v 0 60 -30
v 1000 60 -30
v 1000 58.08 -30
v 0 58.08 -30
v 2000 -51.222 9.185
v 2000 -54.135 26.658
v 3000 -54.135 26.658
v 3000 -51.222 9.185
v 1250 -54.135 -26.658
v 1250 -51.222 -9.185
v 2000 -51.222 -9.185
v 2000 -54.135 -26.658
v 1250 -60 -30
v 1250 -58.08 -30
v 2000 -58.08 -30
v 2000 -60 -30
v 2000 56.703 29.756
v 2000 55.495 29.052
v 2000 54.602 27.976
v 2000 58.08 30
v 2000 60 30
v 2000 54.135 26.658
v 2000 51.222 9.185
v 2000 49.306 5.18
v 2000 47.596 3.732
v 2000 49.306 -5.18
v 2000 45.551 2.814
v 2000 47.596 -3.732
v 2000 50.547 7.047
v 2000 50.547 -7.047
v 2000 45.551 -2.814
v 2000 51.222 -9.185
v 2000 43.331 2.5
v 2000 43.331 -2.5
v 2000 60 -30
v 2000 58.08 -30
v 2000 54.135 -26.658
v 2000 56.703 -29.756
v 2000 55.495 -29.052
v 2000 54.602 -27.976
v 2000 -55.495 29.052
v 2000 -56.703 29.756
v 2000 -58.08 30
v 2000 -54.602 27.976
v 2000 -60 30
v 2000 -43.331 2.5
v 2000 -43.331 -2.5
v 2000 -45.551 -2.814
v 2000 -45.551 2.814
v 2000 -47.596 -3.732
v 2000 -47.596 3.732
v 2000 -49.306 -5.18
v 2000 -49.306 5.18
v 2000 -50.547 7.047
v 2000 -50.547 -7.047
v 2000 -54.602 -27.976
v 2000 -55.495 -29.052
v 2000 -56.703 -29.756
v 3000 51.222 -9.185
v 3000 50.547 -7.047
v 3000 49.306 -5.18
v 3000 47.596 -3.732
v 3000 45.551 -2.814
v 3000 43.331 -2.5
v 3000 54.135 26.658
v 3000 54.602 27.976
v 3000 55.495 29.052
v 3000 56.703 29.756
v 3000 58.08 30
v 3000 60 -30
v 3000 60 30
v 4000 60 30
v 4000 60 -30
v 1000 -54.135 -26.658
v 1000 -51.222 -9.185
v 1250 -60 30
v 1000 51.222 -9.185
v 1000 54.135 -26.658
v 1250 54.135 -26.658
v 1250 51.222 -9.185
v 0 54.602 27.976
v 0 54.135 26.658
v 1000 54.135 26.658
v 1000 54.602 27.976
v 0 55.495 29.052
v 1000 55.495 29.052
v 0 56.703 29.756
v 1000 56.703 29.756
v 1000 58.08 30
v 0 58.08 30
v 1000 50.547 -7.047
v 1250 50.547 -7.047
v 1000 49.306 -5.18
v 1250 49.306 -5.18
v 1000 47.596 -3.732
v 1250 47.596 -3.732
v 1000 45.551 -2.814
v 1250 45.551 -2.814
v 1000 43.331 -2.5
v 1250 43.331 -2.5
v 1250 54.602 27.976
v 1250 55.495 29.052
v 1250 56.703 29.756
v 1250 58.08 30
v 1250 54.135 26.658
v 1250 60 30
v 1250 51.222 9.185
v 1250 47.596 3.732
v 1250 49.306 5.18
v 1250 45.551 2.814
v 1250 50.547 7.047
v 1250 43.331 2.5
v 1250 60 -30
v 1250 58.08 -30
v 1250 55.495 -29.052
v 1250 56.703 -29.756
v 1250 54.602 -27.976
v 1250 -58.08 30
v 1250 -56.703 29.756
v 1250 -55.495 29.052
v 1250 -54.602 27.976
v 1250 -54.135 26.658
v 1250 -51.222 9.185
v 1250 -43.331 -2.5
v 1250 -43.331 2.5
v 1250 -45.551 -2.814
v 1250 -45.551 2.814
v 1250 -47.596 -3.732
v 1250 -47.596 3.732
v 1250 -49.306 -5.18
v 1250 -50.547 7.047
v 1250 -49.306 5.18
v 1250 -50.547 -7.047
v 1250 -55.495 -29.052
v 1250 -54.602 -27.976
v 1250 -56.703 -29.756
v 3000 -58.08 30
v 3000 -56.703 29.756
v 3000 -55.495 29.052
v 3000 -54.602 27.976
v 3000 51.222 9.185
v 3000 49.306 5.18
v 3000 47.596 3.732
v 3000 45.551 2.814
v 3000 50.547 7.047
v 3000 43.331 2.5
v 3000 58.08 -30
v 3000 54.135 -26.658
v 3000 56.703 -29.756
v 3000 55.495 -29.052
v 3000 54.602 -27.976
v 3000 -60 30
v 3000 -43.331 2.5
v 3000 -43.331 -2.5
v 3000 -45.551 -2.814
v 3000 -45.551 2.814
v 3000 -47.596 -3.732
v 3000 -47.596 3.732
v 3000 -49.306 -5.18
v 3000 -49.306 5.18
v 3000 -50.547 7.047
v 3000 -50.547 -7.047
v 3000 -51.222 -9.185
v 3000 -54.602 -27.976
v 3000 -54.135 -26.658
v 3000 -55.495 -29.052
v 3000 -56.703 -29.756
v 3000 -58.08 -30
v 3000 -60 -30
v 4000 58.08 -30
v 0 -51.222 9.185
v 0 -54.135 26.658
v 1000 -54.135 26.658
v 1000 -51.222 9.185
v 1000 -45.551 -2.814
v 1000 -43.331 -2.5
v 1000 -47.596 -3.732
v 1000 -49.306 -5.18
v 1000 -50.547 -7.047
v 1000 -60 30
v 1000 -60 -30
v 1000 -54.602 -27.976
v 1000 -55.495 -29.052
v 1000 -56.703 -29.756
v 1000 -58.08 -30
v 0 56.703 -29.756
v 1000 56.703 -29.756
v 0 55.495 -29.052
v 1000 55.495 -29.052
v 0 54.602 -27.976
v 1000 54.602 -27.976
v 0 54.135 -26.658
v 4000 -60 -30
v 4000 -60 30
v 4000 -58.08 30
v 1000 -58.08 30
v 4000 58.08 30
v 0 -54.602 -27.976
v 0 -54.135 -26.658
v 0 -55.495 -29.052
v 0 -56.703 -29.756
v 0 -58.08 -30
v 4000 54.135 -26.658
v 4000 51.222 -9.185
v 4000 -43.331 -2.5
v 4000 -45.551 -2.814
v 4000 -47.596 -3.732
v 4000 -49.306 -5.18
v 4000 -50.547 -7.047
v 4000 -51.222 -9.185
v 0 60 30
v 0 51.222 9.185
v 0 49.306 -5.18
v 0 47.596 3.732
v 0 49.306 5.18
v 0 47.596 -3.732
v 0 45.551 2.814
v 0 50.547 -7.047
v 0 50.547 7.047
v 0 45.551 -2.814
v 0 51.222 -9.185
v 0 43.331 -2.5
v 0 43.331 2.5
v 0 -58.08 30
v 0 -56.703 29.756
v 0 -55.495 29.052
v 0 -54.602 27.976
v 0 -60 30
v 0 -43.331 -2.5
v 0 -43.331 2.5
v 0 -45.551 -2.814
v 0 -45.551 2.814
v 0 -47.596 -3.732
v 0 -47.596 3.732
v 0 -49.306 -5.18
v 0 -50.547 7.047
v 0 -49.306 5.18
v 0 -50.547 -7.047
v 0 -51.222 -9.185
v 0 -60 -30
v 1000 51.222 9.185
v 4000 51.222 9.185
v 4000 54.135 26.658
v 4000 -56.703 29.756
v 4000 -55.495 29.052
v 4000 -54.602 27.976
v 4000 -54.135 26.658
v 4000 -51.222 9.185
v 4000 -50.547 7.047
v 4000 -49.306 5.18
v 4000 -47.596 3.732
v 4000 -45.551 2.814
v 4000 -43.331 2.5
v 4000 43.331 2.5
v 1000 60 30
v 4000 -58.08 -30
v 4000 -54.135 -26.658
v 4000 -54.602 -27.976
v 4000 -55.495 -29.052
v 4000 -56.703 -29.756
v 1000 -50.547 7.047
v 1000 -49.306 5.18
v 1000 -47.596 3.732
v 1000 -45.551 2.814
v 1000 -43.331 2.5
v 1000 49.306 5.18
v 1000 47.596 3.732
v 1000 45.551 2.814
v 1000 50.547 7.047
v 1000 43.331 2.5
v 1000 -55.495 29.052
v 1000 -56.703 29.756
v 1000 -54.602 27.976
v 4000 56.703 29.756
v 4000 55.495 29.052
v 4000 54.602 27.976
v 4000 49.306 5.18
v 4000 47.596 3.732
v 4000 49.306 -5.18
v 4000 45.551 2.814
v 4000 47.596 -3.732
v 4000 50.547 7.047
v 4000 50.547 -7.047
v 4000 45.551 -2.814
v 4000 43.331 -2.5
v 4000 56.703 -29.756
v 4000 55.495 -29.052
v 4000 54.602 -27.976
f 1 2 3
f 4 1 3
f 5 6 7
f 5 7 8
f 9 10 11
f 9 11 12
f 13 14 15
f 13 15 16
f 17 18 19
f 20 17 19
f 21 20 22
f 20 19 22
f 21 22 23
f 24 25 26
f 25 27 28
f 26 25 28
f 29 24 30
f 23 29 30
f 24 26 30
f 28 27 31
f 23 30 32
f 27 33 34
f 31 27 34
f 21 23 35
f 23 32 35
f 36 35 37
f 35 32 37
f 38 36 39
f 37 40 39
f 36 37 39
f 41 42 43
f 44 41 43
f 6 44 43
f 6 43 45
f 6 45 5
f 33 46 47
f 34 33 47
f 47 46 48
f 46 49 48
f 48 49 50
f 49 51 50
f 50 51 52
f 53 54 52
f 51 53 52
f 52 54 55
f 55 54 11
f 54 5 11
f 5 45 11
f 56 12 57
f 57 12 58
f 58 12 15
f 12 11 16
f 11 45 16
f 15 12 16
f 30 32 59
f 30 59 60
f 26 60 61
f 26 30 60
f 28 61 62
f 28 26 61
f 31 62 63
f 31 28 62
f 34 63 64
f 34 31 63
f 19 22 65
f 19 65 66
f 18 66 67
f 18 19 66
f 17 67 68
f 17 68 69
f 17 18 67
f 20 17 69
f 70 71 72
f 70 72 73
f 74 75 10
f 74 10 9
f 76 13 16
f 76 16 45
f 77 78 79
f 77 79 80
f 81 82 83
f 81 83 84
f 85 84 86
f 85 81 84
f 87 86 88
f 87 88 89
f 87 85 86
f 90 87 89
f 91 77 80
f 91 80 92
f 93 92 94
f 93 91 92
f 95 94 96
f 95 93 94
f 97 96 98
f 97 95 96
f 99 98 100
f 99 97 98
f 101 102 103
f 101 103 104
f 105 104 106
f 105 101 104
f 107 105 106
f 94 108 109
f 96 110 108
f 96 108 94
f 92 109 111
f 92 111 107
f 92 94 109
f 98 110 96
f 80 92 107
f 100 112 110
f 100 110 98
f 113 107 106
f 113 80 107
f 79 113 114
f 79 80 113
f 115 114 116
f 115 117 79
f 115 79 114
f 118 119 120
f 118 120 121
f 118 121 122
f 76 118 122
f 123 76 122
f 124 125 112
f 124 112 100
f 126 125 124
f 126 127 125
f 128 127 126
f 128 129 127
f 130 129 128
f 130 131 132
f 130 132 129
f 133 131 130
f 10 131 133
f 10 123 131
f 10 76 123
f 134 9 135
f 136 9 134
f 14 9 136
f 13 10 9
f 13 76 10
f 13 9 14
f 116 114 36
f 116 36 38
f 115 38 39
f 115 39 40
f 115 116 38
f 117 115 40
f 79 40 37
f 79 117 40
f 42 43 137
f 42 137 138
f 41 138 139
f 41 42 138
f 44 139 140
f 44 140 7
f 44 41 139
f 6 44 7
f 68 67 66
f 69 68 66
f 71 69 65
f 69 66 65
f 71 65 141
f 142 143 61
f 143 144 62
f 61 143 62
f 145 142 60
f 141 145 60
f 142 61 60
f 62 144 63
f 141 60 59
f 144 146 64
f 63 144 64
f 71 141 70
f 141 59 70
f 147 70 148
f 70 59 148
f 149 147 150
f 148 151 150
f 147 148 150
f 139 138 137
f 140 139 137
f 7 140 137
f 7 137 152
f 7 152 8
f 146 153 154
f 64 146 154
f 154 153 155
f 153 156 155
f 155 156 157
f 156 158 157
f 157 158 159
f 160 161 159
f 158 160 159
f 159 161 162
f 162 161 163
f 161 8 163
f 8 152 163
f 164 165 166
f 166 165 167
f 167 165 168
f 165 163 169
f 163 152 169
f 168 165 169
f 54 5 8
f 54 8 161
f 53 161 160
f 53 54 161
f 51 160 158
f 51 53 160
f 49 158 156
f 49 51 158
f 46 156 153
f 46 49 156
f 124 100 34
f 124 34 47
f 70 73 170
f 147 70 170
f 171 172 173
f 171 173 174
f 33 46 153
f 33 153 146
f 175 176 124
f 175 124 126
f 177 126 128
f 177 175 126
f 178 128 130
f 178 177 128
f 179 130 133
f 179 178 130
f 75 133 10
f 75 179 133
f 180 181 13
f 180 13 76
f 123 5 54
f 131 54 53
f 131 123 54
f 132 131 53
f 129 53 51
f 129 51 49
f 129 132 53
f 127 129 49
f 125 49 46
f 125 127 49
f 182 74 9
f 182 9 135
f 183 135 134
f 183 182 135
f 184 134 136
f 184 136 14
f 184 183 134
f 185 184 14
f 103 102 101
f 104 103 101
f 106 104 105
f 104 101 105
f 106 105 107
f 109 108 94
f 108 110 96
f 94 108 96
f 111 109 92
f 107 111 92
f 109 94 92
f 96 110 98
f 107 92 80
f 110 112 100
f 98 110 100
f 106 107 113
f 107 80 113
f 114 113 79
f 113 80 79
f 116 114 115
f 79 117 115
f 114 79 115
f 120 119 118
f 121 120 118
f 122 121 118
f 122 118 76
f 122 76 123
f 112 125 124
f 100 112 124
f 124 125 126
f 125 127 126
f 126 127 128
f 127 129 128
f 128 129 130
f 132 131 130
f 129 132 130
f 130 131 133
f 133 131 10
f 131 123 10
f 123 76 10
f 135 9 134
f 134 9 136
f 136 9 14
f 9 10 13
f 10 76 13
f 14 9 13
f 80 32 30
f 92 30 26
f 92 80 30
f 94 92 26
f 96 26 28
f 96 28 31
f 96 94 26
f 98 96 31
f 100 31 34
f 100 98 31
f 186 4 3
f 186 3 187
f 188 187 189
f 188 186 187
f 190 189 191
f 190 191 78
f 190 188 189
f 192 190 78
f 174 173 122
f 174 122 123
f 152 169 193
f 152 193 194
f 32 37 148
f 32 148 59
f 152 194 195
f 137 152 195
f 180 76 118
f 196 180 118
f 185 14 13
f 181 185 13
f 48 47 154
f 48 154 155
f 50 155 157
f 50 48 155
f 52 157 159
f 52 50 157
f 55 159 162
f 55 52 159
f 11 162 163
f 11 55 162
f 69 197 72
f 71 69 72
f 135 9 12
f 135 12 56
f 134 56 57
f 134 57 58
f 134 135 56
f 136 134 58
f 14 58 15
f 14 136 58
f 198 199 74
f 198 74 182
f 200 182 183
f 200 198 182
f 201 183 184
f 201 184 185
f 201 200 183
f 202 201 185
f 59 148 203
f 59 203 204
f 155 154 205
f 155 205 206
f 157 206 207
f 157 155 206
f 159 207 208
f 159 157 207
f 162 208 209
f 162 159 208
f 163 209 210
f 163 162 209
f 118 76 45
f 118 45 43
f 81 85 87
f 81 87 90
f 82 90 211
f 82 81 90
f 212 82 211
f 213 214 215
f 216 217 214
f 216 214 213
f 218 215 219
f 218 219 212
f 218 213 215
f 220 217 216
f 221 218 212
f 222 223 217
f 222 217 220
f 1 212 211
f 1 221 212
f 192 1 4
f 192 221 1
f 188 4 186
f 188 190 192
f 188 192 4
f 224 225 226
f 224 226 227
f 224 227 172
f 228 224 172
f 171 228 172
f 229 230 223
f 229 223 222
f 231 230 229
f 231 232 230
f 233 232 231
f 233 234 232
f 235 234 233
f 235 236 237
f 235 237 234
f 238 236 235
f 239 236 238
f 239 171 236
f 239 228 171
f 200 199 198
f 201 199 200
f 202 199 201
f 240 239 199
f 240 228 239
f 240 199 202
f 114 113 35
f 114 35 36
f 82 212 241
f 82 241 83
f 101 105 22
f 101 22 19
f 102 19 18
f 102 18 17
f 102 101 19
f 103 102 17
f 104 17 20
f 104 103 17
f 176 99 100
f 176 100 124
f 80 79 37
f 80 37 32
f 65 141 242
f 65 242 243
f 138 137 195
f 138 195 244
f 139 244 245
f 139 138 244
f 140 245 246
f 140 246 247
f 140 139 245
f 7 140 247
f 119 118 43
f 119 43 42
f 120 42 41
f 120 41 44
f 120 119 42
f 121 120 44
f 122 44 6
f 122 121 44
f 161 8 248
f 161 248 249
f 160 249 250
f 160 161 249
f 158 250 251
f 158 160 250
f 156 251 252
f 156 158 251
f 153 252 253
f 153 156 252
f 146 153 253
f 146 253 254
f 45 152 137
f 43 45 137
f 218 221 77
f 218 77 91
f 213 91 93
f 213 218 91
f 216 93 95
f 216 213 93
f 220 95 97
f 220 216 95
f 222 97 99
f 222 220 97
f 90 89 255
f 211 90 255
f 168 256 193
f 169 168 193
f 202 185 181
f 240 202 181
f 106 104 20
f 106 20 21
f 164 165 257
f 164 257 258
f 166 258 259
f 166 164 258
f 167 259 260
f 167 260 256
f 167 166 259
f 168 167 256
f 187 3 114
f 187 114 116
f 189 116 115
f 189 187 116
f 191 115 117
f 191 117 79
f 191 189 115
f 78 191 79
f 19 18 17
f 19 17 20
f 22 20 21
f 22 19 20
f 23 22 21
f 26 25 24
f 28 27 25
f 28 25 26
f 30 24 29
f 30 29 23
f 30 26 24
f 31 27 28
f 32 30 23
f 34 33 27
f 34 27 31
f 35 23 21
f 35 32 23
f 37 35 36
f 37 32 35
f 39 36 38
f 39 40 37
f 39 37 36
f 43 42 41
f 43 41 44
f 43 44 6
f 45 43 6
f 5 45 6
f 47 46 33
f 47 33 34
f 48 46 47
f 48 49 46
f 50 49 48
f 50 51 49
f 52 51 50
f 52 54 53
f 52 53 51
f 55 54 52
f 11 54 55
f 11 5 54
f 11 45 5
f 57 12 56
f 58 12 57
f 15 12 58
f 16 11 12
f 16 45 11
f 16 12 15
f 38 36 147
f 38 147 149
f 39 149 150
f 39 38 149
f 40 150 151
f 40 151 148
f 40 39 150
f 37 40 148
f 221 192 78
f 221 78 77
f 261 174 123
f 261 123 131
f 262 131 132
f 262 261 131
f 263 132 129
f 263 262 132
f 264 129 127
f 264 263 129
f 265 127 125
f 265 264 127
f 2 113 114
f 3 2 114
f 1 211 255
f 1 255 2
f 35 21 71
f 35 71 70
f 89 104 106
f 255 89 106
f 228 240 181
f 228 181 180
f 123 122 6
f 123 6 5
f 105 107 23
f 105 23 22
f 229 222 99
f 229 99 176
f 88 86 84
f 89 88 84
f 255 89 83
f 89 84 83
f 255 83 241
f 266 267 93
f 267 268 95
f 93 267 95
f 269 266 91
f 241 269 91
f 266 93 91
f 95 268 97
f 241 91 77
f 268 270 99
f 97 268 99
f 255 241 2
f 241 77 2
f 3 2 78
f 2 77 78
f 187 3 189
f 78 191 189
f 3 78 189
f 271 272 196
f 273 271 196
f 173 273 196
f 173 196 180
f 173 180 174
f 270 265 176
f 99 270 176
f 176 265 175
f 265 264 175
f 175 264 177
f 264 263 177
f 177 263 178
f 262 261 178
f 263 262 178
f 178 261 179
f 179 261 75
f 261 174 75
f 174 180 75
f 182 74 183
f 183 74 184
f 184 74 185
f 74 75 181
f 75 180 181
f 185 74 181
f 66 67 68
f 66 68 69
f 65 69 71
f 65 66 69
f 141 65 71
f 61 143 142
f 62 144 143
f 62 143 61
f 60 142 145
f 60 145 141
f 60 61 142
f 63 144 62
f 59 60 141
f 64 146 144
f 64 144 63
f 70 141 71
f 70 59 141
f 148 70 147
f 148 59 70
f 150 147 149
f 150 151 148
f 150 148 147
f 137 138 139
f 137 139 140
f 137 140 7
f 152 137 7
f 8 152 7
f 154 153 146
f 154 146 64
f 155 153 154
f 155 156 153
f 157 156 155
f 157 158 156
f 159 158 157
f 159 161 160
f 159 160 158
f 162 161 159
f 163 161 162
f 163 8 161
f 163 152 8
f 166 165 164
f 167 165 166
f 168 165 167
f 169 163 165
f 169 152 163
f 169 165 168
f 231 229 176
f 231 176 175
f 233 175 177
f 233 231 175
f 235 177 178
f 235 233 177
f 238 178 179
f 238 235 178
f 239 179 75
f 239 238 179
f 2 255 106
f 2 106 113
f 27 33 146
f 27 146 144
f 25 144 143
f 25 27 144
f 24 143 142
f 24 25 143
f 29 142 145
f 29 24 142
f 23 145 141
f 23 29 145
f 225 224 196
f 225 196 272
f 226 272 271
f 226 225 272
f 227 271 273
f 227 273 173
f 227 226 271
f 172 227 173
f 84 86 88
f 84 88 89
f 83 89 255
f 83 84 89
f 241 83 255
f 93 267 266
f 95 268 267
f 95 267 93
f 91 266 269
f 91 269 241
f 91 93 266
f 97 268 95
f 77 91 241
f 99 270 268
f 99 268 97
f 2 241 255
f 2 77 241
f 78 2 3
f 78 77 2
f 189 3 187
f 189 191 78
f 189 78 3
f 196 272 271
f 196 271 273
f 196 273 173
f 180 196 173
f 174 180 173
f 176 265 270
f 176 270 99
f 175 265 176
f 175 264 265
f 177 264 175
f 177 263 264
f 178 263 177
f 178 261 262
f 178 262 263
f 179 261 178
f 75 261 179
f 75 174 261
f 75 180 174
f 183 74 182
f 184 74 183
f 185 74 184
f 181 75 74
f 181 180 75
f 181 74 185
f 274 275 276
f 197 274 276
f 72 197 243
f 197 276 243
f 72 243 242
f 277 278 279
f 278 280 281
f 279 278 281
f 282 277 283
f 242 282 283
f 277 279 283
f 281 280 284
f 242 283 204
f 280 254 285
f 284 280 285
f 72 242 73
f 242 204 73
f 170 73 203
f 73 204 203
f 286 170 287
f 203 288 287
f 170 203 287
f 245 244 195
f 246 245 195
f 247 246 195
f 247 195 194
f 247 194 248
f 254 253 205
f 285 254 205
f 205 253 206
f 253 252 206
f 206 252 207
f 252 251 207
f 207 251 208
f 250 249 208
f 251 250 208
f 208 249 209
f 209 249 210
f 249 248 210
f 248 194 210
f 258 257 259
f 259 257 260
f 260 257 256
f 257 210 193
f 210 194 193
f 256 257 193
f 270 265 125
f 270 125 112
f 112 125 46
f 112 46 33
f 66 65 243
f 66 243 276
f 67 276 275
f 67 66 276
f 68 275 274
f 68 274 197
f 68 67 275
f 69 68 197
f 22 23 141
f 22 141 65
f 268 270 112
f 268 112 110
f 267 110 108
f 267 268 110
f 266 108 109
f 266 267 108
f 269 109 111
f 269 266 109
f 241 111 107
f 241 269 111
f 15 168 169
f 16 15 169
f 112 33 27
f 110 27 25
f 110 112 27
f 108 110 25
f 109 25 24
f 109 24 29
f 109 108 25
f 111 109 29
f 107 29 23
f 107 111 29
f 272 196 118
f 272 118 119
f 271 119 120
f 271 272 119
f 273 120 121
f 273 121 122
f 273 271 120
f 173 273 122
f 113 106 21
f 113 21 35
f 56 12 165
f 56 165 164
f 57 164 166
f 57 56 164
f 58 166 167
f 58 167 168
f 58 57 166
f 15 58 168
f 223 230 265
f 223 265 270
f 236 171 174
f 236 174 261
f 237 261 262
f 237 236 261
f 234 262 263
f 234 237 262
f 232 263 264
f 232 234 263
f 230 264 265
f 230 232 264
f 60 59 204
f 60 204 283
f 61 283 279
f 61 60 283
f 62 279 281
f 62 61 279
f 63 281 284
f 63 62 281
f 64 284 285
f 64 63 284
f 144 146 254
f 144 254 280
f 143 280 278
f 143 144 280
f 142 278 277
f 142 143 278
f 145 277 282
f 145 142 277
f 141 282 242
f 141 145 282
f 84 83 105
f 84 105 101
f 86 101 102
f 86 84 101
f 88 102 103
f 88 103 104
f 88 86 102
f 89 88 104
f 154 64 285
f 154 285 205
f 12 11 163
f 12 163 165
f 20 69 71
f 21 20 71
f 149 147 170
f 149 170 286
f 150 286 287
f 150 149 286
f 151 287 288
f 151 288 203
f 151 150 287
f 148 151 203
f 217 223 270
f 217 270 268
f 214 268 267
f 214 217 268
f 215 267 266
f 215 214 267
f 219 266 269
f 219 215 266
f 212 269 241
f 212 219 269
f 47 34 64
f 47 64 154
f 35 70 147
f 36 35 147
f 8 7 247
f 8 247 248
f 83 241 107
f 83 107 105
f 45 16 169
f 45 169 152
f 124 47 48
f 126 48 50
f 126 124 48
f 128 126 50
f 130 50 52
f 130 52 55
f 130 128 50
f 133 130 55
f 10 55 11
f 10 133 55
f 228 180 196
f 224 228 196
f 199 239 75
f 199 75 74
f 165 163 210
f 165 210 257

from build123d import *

# Parameters (mm, degrees)
SB_BEAM_120_X_12_1_DEPTH   = 1000
SB_BEAM_120_X_12_1_2_DEPTH = 250
SB_BEAM_120_X_12_1_3_DEPTH = 750
SB_BEAM_120_X_12_1_4_DEPTH = 1000
SB_BEAM_120_X_12_1_5_DEPTH = 1000


with BuildPart() as part:
    # Sketch11 → Sb beam 120 X 12(1) (new body)
    with BuildSketch(Plane(origin=(0, 0, 0), x_dir=(0, 0, 1), z_dir=(1, 0, 0))):
        with BuildLine():
            Line((-30, -60), (-30, -58.080070835))
            ThreePointArc((-30, -58.080070835), (-29.052095223, -55.494589303), (-26.657642624, -54.134502919))
            Line((-26.657642624, -54.134502919), (-9.184714752, -51.222135832))
            ThreePointArc((-9.184714752, -51.222135832), (-4.395809555, -48.501963064), (-2.5, -43.331))
            Line((-2.5, -43.331), (-2.5, 43.331))
            ThreePointArc((-2.5, 43.331), (-4.395809555, 48.501963064), (-9.184714752, 51.222135832))
            Line((-9.184714752, 51.222135832), (-26.657642624, 54.134502919))
            ThreePointArc((-26.657642624, 54.134502919), (-29.052095223, 55.494589303), (-30, 58.080070835))
            Line((-30, 58.080070835), (-30, 60))
            Line((-30, 60), (30, 60))
            Line((30, 60), (30, 58.080070835))
            ThreePointArc((30, 58.080070835), (29.052095223, 55.494589303), (26.657642624, 54.134502919))
            Line((26.657642624, 54.134502919), (9.184714752, 51.222135832))
            ThreePointArc((9.184714752, 51.222135832), (4.395809555, 48.501963064), (2.5, 43.331))
            Line((2.5, 43.331), (2.5, -43.331))
            ThreePointArc((2.5, -43.331), (4.395809555, -48.501963064), (9.184714752, -51.222135832))
            Line((9.184714752, -51.222135832), (26.657642624, -54.134502919))
            ThreePointArc((26.657642624, -54.134502919), (29.052095223, -55.494589303), (30, -58.080070835))
            Line((30, -58.080070835), (30, -60))
            Line((30, -60), (-30, -60))
        make_face()
    extrude(amount=SB_BEAM_120_X_12_1_DEPTH)


with BuildPart() as body_2:
    # Sketch11 on segment 2 (carried to segment 2) → Sb beam 120 X 12_1 2 (new body)
    with BuildSketch(Plane(origin=(1000, 0, 0), x_dir=(0, 0, 1), z_dir=(1, 0, 0))):
        with BuildLine():
            Line((-30, -60), (-30, -58.080070835))
            ThreePointArc((-30, -58.080070835), (-29.052095223, -55.494589303), (-26.657642624, -54.134502919))
            Line((-26.657642624, -54.134502919), (-9.184714752, -51.222135832))
            ThreePointArc((-9.184714752, -51.222135832), (-4.395809555, -48.501963064), (-2.5, -43.331))
            Line((-2.5, -43.331), (-2.5, 43.331))
            ThreePointArc((-2.5, 43.331), (-4.395809555, 48.501963064), (-9.184714752, 51.222135832))
            Line((-9.184714752, 51.222135832), (-26.657642624, 54.134502919))
            ThreePointArc((-26.657642624, 54.134502919), (-29.052095223, 55.494589303), (-30, 58.080070835))
            Line((-30, 58.080070835), (-30, 60))
            Line((-30, 60), (30, 60))
            Line((30, 60), (30, 58.080070835))
            ThreePointArc((30, 58.080070835), (29.052095223, 55.494589303), (26.657642624, 54.134502919))
            Line((26.657642624, 54.134502919), (9.184714752, 51.222135832))
            ThreePointArc((9.184714752, 51.222135832), (4.395809555, 48.501963064), (2.5, 43.331))
            Line((2.5, 43.331), (2.5, -43.331))
            ThreePointArc((2.5, -43.331), (4.395809555, -48.501963064), (9.184714752, -51.222135832))
            Line((9.184714752, -51.222135832), (26.657642624, -54.134502919))
            ThreePointArc((26.657642624, -54.134502919), (29.052095223, -55.494589303), (30, -58.080070835))
            Line((30, -58.080070835), (30, -60))
            Line((30, -60), (-30, -60))
        make_face()
    extrude(amount=SB_BEAM_120_X_12_1_2_DEPTH)


with BuildPart() as body_3:
    # Sketch11 on segment 3 (carried to segment 3) → Sb beam 120 X 12_1 3 (new body)
    with BuildSketch(Plane(origin=(1250, 0, 0), x_dir=(0, 0, 1), z_dir=(1, 0, 0))):
        with BuildLine():
            Line((-30, -60), (-30, -58.080070835))
            ThreePointArc((-30, -58.080070835), (-29.052095223, -55.494589303), (-26.657642624, -54.134502919))
            Line((-26.657642624, -54.134502919), (-9.184714752, -51.222135832))
            ThreePointArc((-9.184714752, -51.222135832), (-4.395809555, -48.501963064), (-2.5, -43.331))
            Line((-2.5, -43.331), (-2.5, 43.331))
            ThreePointArc((-2.5, 43.331), (-4.395809555, 48.501963064), (-9.184714752, 51.222135832))
            Line((-9.184714752, 51.222135832), (-26.657642624, 54.134502919))
            ThreePointArc((-26.657642624, 54.134502919), (-29.052095223, 55.494589303), (-30, 58.080070835))
            Line((-30, 58.080070835), (-30, 60))
            Line((-30, 60), (30, 60))
            Line((30, 60), (30, 58.080070835))
            ThreePointArc((30, 58.080070835), (29.052095223, 55.494589303), (26.657642624, 54.134502919))
            Line((26.657642624, 54.134502919), (9.184714752, 51.222135832))
            ThreePointArc((9.184714752, 51.222135832), (4.395809555, 48.501963064), (2.5, 43.331))
            Line((2.5, 43.331), (2.5, -43.331))
            ThreePointArc((2.5, -43.331), (4.395809555, -48.501963064), (9.184714752, -51.222135832))
            Line((9.184714752, -51.222135832), (26.657642624, -54.134502919))
            ThreePointArc((26.657642624, -54.134502919), (29.052095223, -55.494589303), (30, -58.080070835))
            Line((30, -58.080070835), (30, -60))
            Line((30, -60), (-30, -60))
        make_face()
    extrude(amount=SB_BEAM_120_X_12_1_3_DEPTH)


with BuildPart() as body_4:
    # Sketch11 on segment 4 (carried to segment 4) → Sb beam 120 X 12_1 4 (new body)
    with BuildSketch(Plane(origin=(2000, 0, 0), x_dir=(0, 0, 1), z_dir=(1, 0, 0))):
        with BuildLine():
            Line((-30, -60), (-30, -58.080070835))
            ThreePointArc((-30, -58.080070835), (-29.052095223, -55.494589303), (-26.657642624, -54.134502919))
            Line((-26.657642624, -54.134502919), (-9.184714752, -51.222135832))
            ThreePointArc((-9.184714752, -51.222135832), (-4.395809555, -48.501963064), (-2.5, -43.331))
            Line((-2.5, -43.331), (-2.5, 43.331))
            ThreePointArc((-2.5, 43.331), (-4.395809555, 48.501963064), (-9.184714752, 51.222135832))
            Line((-9.184714752, 51.222135832), (-26.657642624, 54.134502919))
            ThreePointArc((-26.657642624, 54.134502919), (-29.052095223, 55.494589303), (-30, 58.080070835))
            Line((-30, 58.080070835), (-30, 60))
            Line((-30, 60), (30, 60))
            Line((30, 60), (30, 58.080070835))
            ThreePointArc((30, 58.080070835), (29.052095223, 55.494589303), (26.657642624, 54.134502919))
            Line((26.657642624, 54.134502919), (9.184714752, 51.222135832))
            ThreePointArc((9.184714752, 51.222135832), (4.395809555, 48.501963064), (2.5, 43.331))
            Line((2.5, 43.331), (2.5, -43.331))
            ThreePointArc((2.5, -43.331), (4.395809555, -48.501963064), (9.184714752, -51.222135832))
            Line((9.184714752, -51.222135832), (26.657642624, -54.134502919))
            ThreePointArc((26.657642624, -54.134502919), (29.052095223, -55.494589303), (30, -58.080070835))
            Line((30, -58.080070835), (30, -60))
            Line((30, -60), (-30, -60))
        make_face()
    extrude(amount=SB_BEAM_120_X_12_1_4_DEPTH)


with BuildPart() as body_5:
    # Sketch11 on segment 5 (carried to segment 5) → Sb beam 120 X 12_1 5 (new body)
    with BuildSketch(Plane(origin=(3000, 0, 0), x_dir=(0, 0, 1), z_dir=(1, 0, 0))):
        with BuildLine():
            Line((-30, -60), (-30, -58.080070835))
            ThreePointArc((-30, -58.080070835), (-29.052095223, -55.494589303), (-26.657642624, -54.134502919))
            Line((-26.657642624, -54.134502919), (-9.184714752, -51.222135832))
            ThreePointArc((-9.184714752, -51.222135832), (-4.395809555, -48.501963064), (-2.5, -43.331))
            Line((-2.5, -43.331), (-2.5, 43.331))
            ThreePointArc((-2.5, 43.331), (-4.395809555, 48.501963064), (-9.184714752, 51.222135832))
            Line((-9.184714752, 51.222135832), (-26.657642624, 54.134502919))
            ThreePointArc((-26.657642624, 54.134502919), (-29.052095223, 55.494589303), (-30, 58.080070835))
            Line((-30, 58.080070835), (-30, 60))
            Line((-30, 60), (30, 60))
            Line((30, 60), (30, 58.080070835))
            ThreePointArc((30, 58.080070835), (29.052095223, 55.494589303), (26.657642624, 54.134502919))
            Line((26.657642624, 54.134502919), (9.184714752, 51.222135832))
            ThreePointArc((9.184714752, 51.222135832), (4.395809555, 48.501963064), (2.5, 43.331))
            Line((2.5, 43.331), (2.5, -43.331))
            ThreePointArc((2.5, -43.331), (4.395809555, -48.501963064), (9.184714752, -51.222135832))
            Line((9.184714752, -51.222135832), (26.657642624, -54.134502919))
            ThreePointArc((26.657642624, -54.134502919), (29.052095223, -55.494589303), (30, -58.080070835))
            Line((30, -58.080070835), (30, -60))
            Line((30, -60), (-30, -60))
        make_face()
    extrude(amount=SB_BEAM_120_X_12_1_5_DEPTH)


solid = Compound([part.part, body_2.part, body_3.part, body_4.part, body_5.part])
